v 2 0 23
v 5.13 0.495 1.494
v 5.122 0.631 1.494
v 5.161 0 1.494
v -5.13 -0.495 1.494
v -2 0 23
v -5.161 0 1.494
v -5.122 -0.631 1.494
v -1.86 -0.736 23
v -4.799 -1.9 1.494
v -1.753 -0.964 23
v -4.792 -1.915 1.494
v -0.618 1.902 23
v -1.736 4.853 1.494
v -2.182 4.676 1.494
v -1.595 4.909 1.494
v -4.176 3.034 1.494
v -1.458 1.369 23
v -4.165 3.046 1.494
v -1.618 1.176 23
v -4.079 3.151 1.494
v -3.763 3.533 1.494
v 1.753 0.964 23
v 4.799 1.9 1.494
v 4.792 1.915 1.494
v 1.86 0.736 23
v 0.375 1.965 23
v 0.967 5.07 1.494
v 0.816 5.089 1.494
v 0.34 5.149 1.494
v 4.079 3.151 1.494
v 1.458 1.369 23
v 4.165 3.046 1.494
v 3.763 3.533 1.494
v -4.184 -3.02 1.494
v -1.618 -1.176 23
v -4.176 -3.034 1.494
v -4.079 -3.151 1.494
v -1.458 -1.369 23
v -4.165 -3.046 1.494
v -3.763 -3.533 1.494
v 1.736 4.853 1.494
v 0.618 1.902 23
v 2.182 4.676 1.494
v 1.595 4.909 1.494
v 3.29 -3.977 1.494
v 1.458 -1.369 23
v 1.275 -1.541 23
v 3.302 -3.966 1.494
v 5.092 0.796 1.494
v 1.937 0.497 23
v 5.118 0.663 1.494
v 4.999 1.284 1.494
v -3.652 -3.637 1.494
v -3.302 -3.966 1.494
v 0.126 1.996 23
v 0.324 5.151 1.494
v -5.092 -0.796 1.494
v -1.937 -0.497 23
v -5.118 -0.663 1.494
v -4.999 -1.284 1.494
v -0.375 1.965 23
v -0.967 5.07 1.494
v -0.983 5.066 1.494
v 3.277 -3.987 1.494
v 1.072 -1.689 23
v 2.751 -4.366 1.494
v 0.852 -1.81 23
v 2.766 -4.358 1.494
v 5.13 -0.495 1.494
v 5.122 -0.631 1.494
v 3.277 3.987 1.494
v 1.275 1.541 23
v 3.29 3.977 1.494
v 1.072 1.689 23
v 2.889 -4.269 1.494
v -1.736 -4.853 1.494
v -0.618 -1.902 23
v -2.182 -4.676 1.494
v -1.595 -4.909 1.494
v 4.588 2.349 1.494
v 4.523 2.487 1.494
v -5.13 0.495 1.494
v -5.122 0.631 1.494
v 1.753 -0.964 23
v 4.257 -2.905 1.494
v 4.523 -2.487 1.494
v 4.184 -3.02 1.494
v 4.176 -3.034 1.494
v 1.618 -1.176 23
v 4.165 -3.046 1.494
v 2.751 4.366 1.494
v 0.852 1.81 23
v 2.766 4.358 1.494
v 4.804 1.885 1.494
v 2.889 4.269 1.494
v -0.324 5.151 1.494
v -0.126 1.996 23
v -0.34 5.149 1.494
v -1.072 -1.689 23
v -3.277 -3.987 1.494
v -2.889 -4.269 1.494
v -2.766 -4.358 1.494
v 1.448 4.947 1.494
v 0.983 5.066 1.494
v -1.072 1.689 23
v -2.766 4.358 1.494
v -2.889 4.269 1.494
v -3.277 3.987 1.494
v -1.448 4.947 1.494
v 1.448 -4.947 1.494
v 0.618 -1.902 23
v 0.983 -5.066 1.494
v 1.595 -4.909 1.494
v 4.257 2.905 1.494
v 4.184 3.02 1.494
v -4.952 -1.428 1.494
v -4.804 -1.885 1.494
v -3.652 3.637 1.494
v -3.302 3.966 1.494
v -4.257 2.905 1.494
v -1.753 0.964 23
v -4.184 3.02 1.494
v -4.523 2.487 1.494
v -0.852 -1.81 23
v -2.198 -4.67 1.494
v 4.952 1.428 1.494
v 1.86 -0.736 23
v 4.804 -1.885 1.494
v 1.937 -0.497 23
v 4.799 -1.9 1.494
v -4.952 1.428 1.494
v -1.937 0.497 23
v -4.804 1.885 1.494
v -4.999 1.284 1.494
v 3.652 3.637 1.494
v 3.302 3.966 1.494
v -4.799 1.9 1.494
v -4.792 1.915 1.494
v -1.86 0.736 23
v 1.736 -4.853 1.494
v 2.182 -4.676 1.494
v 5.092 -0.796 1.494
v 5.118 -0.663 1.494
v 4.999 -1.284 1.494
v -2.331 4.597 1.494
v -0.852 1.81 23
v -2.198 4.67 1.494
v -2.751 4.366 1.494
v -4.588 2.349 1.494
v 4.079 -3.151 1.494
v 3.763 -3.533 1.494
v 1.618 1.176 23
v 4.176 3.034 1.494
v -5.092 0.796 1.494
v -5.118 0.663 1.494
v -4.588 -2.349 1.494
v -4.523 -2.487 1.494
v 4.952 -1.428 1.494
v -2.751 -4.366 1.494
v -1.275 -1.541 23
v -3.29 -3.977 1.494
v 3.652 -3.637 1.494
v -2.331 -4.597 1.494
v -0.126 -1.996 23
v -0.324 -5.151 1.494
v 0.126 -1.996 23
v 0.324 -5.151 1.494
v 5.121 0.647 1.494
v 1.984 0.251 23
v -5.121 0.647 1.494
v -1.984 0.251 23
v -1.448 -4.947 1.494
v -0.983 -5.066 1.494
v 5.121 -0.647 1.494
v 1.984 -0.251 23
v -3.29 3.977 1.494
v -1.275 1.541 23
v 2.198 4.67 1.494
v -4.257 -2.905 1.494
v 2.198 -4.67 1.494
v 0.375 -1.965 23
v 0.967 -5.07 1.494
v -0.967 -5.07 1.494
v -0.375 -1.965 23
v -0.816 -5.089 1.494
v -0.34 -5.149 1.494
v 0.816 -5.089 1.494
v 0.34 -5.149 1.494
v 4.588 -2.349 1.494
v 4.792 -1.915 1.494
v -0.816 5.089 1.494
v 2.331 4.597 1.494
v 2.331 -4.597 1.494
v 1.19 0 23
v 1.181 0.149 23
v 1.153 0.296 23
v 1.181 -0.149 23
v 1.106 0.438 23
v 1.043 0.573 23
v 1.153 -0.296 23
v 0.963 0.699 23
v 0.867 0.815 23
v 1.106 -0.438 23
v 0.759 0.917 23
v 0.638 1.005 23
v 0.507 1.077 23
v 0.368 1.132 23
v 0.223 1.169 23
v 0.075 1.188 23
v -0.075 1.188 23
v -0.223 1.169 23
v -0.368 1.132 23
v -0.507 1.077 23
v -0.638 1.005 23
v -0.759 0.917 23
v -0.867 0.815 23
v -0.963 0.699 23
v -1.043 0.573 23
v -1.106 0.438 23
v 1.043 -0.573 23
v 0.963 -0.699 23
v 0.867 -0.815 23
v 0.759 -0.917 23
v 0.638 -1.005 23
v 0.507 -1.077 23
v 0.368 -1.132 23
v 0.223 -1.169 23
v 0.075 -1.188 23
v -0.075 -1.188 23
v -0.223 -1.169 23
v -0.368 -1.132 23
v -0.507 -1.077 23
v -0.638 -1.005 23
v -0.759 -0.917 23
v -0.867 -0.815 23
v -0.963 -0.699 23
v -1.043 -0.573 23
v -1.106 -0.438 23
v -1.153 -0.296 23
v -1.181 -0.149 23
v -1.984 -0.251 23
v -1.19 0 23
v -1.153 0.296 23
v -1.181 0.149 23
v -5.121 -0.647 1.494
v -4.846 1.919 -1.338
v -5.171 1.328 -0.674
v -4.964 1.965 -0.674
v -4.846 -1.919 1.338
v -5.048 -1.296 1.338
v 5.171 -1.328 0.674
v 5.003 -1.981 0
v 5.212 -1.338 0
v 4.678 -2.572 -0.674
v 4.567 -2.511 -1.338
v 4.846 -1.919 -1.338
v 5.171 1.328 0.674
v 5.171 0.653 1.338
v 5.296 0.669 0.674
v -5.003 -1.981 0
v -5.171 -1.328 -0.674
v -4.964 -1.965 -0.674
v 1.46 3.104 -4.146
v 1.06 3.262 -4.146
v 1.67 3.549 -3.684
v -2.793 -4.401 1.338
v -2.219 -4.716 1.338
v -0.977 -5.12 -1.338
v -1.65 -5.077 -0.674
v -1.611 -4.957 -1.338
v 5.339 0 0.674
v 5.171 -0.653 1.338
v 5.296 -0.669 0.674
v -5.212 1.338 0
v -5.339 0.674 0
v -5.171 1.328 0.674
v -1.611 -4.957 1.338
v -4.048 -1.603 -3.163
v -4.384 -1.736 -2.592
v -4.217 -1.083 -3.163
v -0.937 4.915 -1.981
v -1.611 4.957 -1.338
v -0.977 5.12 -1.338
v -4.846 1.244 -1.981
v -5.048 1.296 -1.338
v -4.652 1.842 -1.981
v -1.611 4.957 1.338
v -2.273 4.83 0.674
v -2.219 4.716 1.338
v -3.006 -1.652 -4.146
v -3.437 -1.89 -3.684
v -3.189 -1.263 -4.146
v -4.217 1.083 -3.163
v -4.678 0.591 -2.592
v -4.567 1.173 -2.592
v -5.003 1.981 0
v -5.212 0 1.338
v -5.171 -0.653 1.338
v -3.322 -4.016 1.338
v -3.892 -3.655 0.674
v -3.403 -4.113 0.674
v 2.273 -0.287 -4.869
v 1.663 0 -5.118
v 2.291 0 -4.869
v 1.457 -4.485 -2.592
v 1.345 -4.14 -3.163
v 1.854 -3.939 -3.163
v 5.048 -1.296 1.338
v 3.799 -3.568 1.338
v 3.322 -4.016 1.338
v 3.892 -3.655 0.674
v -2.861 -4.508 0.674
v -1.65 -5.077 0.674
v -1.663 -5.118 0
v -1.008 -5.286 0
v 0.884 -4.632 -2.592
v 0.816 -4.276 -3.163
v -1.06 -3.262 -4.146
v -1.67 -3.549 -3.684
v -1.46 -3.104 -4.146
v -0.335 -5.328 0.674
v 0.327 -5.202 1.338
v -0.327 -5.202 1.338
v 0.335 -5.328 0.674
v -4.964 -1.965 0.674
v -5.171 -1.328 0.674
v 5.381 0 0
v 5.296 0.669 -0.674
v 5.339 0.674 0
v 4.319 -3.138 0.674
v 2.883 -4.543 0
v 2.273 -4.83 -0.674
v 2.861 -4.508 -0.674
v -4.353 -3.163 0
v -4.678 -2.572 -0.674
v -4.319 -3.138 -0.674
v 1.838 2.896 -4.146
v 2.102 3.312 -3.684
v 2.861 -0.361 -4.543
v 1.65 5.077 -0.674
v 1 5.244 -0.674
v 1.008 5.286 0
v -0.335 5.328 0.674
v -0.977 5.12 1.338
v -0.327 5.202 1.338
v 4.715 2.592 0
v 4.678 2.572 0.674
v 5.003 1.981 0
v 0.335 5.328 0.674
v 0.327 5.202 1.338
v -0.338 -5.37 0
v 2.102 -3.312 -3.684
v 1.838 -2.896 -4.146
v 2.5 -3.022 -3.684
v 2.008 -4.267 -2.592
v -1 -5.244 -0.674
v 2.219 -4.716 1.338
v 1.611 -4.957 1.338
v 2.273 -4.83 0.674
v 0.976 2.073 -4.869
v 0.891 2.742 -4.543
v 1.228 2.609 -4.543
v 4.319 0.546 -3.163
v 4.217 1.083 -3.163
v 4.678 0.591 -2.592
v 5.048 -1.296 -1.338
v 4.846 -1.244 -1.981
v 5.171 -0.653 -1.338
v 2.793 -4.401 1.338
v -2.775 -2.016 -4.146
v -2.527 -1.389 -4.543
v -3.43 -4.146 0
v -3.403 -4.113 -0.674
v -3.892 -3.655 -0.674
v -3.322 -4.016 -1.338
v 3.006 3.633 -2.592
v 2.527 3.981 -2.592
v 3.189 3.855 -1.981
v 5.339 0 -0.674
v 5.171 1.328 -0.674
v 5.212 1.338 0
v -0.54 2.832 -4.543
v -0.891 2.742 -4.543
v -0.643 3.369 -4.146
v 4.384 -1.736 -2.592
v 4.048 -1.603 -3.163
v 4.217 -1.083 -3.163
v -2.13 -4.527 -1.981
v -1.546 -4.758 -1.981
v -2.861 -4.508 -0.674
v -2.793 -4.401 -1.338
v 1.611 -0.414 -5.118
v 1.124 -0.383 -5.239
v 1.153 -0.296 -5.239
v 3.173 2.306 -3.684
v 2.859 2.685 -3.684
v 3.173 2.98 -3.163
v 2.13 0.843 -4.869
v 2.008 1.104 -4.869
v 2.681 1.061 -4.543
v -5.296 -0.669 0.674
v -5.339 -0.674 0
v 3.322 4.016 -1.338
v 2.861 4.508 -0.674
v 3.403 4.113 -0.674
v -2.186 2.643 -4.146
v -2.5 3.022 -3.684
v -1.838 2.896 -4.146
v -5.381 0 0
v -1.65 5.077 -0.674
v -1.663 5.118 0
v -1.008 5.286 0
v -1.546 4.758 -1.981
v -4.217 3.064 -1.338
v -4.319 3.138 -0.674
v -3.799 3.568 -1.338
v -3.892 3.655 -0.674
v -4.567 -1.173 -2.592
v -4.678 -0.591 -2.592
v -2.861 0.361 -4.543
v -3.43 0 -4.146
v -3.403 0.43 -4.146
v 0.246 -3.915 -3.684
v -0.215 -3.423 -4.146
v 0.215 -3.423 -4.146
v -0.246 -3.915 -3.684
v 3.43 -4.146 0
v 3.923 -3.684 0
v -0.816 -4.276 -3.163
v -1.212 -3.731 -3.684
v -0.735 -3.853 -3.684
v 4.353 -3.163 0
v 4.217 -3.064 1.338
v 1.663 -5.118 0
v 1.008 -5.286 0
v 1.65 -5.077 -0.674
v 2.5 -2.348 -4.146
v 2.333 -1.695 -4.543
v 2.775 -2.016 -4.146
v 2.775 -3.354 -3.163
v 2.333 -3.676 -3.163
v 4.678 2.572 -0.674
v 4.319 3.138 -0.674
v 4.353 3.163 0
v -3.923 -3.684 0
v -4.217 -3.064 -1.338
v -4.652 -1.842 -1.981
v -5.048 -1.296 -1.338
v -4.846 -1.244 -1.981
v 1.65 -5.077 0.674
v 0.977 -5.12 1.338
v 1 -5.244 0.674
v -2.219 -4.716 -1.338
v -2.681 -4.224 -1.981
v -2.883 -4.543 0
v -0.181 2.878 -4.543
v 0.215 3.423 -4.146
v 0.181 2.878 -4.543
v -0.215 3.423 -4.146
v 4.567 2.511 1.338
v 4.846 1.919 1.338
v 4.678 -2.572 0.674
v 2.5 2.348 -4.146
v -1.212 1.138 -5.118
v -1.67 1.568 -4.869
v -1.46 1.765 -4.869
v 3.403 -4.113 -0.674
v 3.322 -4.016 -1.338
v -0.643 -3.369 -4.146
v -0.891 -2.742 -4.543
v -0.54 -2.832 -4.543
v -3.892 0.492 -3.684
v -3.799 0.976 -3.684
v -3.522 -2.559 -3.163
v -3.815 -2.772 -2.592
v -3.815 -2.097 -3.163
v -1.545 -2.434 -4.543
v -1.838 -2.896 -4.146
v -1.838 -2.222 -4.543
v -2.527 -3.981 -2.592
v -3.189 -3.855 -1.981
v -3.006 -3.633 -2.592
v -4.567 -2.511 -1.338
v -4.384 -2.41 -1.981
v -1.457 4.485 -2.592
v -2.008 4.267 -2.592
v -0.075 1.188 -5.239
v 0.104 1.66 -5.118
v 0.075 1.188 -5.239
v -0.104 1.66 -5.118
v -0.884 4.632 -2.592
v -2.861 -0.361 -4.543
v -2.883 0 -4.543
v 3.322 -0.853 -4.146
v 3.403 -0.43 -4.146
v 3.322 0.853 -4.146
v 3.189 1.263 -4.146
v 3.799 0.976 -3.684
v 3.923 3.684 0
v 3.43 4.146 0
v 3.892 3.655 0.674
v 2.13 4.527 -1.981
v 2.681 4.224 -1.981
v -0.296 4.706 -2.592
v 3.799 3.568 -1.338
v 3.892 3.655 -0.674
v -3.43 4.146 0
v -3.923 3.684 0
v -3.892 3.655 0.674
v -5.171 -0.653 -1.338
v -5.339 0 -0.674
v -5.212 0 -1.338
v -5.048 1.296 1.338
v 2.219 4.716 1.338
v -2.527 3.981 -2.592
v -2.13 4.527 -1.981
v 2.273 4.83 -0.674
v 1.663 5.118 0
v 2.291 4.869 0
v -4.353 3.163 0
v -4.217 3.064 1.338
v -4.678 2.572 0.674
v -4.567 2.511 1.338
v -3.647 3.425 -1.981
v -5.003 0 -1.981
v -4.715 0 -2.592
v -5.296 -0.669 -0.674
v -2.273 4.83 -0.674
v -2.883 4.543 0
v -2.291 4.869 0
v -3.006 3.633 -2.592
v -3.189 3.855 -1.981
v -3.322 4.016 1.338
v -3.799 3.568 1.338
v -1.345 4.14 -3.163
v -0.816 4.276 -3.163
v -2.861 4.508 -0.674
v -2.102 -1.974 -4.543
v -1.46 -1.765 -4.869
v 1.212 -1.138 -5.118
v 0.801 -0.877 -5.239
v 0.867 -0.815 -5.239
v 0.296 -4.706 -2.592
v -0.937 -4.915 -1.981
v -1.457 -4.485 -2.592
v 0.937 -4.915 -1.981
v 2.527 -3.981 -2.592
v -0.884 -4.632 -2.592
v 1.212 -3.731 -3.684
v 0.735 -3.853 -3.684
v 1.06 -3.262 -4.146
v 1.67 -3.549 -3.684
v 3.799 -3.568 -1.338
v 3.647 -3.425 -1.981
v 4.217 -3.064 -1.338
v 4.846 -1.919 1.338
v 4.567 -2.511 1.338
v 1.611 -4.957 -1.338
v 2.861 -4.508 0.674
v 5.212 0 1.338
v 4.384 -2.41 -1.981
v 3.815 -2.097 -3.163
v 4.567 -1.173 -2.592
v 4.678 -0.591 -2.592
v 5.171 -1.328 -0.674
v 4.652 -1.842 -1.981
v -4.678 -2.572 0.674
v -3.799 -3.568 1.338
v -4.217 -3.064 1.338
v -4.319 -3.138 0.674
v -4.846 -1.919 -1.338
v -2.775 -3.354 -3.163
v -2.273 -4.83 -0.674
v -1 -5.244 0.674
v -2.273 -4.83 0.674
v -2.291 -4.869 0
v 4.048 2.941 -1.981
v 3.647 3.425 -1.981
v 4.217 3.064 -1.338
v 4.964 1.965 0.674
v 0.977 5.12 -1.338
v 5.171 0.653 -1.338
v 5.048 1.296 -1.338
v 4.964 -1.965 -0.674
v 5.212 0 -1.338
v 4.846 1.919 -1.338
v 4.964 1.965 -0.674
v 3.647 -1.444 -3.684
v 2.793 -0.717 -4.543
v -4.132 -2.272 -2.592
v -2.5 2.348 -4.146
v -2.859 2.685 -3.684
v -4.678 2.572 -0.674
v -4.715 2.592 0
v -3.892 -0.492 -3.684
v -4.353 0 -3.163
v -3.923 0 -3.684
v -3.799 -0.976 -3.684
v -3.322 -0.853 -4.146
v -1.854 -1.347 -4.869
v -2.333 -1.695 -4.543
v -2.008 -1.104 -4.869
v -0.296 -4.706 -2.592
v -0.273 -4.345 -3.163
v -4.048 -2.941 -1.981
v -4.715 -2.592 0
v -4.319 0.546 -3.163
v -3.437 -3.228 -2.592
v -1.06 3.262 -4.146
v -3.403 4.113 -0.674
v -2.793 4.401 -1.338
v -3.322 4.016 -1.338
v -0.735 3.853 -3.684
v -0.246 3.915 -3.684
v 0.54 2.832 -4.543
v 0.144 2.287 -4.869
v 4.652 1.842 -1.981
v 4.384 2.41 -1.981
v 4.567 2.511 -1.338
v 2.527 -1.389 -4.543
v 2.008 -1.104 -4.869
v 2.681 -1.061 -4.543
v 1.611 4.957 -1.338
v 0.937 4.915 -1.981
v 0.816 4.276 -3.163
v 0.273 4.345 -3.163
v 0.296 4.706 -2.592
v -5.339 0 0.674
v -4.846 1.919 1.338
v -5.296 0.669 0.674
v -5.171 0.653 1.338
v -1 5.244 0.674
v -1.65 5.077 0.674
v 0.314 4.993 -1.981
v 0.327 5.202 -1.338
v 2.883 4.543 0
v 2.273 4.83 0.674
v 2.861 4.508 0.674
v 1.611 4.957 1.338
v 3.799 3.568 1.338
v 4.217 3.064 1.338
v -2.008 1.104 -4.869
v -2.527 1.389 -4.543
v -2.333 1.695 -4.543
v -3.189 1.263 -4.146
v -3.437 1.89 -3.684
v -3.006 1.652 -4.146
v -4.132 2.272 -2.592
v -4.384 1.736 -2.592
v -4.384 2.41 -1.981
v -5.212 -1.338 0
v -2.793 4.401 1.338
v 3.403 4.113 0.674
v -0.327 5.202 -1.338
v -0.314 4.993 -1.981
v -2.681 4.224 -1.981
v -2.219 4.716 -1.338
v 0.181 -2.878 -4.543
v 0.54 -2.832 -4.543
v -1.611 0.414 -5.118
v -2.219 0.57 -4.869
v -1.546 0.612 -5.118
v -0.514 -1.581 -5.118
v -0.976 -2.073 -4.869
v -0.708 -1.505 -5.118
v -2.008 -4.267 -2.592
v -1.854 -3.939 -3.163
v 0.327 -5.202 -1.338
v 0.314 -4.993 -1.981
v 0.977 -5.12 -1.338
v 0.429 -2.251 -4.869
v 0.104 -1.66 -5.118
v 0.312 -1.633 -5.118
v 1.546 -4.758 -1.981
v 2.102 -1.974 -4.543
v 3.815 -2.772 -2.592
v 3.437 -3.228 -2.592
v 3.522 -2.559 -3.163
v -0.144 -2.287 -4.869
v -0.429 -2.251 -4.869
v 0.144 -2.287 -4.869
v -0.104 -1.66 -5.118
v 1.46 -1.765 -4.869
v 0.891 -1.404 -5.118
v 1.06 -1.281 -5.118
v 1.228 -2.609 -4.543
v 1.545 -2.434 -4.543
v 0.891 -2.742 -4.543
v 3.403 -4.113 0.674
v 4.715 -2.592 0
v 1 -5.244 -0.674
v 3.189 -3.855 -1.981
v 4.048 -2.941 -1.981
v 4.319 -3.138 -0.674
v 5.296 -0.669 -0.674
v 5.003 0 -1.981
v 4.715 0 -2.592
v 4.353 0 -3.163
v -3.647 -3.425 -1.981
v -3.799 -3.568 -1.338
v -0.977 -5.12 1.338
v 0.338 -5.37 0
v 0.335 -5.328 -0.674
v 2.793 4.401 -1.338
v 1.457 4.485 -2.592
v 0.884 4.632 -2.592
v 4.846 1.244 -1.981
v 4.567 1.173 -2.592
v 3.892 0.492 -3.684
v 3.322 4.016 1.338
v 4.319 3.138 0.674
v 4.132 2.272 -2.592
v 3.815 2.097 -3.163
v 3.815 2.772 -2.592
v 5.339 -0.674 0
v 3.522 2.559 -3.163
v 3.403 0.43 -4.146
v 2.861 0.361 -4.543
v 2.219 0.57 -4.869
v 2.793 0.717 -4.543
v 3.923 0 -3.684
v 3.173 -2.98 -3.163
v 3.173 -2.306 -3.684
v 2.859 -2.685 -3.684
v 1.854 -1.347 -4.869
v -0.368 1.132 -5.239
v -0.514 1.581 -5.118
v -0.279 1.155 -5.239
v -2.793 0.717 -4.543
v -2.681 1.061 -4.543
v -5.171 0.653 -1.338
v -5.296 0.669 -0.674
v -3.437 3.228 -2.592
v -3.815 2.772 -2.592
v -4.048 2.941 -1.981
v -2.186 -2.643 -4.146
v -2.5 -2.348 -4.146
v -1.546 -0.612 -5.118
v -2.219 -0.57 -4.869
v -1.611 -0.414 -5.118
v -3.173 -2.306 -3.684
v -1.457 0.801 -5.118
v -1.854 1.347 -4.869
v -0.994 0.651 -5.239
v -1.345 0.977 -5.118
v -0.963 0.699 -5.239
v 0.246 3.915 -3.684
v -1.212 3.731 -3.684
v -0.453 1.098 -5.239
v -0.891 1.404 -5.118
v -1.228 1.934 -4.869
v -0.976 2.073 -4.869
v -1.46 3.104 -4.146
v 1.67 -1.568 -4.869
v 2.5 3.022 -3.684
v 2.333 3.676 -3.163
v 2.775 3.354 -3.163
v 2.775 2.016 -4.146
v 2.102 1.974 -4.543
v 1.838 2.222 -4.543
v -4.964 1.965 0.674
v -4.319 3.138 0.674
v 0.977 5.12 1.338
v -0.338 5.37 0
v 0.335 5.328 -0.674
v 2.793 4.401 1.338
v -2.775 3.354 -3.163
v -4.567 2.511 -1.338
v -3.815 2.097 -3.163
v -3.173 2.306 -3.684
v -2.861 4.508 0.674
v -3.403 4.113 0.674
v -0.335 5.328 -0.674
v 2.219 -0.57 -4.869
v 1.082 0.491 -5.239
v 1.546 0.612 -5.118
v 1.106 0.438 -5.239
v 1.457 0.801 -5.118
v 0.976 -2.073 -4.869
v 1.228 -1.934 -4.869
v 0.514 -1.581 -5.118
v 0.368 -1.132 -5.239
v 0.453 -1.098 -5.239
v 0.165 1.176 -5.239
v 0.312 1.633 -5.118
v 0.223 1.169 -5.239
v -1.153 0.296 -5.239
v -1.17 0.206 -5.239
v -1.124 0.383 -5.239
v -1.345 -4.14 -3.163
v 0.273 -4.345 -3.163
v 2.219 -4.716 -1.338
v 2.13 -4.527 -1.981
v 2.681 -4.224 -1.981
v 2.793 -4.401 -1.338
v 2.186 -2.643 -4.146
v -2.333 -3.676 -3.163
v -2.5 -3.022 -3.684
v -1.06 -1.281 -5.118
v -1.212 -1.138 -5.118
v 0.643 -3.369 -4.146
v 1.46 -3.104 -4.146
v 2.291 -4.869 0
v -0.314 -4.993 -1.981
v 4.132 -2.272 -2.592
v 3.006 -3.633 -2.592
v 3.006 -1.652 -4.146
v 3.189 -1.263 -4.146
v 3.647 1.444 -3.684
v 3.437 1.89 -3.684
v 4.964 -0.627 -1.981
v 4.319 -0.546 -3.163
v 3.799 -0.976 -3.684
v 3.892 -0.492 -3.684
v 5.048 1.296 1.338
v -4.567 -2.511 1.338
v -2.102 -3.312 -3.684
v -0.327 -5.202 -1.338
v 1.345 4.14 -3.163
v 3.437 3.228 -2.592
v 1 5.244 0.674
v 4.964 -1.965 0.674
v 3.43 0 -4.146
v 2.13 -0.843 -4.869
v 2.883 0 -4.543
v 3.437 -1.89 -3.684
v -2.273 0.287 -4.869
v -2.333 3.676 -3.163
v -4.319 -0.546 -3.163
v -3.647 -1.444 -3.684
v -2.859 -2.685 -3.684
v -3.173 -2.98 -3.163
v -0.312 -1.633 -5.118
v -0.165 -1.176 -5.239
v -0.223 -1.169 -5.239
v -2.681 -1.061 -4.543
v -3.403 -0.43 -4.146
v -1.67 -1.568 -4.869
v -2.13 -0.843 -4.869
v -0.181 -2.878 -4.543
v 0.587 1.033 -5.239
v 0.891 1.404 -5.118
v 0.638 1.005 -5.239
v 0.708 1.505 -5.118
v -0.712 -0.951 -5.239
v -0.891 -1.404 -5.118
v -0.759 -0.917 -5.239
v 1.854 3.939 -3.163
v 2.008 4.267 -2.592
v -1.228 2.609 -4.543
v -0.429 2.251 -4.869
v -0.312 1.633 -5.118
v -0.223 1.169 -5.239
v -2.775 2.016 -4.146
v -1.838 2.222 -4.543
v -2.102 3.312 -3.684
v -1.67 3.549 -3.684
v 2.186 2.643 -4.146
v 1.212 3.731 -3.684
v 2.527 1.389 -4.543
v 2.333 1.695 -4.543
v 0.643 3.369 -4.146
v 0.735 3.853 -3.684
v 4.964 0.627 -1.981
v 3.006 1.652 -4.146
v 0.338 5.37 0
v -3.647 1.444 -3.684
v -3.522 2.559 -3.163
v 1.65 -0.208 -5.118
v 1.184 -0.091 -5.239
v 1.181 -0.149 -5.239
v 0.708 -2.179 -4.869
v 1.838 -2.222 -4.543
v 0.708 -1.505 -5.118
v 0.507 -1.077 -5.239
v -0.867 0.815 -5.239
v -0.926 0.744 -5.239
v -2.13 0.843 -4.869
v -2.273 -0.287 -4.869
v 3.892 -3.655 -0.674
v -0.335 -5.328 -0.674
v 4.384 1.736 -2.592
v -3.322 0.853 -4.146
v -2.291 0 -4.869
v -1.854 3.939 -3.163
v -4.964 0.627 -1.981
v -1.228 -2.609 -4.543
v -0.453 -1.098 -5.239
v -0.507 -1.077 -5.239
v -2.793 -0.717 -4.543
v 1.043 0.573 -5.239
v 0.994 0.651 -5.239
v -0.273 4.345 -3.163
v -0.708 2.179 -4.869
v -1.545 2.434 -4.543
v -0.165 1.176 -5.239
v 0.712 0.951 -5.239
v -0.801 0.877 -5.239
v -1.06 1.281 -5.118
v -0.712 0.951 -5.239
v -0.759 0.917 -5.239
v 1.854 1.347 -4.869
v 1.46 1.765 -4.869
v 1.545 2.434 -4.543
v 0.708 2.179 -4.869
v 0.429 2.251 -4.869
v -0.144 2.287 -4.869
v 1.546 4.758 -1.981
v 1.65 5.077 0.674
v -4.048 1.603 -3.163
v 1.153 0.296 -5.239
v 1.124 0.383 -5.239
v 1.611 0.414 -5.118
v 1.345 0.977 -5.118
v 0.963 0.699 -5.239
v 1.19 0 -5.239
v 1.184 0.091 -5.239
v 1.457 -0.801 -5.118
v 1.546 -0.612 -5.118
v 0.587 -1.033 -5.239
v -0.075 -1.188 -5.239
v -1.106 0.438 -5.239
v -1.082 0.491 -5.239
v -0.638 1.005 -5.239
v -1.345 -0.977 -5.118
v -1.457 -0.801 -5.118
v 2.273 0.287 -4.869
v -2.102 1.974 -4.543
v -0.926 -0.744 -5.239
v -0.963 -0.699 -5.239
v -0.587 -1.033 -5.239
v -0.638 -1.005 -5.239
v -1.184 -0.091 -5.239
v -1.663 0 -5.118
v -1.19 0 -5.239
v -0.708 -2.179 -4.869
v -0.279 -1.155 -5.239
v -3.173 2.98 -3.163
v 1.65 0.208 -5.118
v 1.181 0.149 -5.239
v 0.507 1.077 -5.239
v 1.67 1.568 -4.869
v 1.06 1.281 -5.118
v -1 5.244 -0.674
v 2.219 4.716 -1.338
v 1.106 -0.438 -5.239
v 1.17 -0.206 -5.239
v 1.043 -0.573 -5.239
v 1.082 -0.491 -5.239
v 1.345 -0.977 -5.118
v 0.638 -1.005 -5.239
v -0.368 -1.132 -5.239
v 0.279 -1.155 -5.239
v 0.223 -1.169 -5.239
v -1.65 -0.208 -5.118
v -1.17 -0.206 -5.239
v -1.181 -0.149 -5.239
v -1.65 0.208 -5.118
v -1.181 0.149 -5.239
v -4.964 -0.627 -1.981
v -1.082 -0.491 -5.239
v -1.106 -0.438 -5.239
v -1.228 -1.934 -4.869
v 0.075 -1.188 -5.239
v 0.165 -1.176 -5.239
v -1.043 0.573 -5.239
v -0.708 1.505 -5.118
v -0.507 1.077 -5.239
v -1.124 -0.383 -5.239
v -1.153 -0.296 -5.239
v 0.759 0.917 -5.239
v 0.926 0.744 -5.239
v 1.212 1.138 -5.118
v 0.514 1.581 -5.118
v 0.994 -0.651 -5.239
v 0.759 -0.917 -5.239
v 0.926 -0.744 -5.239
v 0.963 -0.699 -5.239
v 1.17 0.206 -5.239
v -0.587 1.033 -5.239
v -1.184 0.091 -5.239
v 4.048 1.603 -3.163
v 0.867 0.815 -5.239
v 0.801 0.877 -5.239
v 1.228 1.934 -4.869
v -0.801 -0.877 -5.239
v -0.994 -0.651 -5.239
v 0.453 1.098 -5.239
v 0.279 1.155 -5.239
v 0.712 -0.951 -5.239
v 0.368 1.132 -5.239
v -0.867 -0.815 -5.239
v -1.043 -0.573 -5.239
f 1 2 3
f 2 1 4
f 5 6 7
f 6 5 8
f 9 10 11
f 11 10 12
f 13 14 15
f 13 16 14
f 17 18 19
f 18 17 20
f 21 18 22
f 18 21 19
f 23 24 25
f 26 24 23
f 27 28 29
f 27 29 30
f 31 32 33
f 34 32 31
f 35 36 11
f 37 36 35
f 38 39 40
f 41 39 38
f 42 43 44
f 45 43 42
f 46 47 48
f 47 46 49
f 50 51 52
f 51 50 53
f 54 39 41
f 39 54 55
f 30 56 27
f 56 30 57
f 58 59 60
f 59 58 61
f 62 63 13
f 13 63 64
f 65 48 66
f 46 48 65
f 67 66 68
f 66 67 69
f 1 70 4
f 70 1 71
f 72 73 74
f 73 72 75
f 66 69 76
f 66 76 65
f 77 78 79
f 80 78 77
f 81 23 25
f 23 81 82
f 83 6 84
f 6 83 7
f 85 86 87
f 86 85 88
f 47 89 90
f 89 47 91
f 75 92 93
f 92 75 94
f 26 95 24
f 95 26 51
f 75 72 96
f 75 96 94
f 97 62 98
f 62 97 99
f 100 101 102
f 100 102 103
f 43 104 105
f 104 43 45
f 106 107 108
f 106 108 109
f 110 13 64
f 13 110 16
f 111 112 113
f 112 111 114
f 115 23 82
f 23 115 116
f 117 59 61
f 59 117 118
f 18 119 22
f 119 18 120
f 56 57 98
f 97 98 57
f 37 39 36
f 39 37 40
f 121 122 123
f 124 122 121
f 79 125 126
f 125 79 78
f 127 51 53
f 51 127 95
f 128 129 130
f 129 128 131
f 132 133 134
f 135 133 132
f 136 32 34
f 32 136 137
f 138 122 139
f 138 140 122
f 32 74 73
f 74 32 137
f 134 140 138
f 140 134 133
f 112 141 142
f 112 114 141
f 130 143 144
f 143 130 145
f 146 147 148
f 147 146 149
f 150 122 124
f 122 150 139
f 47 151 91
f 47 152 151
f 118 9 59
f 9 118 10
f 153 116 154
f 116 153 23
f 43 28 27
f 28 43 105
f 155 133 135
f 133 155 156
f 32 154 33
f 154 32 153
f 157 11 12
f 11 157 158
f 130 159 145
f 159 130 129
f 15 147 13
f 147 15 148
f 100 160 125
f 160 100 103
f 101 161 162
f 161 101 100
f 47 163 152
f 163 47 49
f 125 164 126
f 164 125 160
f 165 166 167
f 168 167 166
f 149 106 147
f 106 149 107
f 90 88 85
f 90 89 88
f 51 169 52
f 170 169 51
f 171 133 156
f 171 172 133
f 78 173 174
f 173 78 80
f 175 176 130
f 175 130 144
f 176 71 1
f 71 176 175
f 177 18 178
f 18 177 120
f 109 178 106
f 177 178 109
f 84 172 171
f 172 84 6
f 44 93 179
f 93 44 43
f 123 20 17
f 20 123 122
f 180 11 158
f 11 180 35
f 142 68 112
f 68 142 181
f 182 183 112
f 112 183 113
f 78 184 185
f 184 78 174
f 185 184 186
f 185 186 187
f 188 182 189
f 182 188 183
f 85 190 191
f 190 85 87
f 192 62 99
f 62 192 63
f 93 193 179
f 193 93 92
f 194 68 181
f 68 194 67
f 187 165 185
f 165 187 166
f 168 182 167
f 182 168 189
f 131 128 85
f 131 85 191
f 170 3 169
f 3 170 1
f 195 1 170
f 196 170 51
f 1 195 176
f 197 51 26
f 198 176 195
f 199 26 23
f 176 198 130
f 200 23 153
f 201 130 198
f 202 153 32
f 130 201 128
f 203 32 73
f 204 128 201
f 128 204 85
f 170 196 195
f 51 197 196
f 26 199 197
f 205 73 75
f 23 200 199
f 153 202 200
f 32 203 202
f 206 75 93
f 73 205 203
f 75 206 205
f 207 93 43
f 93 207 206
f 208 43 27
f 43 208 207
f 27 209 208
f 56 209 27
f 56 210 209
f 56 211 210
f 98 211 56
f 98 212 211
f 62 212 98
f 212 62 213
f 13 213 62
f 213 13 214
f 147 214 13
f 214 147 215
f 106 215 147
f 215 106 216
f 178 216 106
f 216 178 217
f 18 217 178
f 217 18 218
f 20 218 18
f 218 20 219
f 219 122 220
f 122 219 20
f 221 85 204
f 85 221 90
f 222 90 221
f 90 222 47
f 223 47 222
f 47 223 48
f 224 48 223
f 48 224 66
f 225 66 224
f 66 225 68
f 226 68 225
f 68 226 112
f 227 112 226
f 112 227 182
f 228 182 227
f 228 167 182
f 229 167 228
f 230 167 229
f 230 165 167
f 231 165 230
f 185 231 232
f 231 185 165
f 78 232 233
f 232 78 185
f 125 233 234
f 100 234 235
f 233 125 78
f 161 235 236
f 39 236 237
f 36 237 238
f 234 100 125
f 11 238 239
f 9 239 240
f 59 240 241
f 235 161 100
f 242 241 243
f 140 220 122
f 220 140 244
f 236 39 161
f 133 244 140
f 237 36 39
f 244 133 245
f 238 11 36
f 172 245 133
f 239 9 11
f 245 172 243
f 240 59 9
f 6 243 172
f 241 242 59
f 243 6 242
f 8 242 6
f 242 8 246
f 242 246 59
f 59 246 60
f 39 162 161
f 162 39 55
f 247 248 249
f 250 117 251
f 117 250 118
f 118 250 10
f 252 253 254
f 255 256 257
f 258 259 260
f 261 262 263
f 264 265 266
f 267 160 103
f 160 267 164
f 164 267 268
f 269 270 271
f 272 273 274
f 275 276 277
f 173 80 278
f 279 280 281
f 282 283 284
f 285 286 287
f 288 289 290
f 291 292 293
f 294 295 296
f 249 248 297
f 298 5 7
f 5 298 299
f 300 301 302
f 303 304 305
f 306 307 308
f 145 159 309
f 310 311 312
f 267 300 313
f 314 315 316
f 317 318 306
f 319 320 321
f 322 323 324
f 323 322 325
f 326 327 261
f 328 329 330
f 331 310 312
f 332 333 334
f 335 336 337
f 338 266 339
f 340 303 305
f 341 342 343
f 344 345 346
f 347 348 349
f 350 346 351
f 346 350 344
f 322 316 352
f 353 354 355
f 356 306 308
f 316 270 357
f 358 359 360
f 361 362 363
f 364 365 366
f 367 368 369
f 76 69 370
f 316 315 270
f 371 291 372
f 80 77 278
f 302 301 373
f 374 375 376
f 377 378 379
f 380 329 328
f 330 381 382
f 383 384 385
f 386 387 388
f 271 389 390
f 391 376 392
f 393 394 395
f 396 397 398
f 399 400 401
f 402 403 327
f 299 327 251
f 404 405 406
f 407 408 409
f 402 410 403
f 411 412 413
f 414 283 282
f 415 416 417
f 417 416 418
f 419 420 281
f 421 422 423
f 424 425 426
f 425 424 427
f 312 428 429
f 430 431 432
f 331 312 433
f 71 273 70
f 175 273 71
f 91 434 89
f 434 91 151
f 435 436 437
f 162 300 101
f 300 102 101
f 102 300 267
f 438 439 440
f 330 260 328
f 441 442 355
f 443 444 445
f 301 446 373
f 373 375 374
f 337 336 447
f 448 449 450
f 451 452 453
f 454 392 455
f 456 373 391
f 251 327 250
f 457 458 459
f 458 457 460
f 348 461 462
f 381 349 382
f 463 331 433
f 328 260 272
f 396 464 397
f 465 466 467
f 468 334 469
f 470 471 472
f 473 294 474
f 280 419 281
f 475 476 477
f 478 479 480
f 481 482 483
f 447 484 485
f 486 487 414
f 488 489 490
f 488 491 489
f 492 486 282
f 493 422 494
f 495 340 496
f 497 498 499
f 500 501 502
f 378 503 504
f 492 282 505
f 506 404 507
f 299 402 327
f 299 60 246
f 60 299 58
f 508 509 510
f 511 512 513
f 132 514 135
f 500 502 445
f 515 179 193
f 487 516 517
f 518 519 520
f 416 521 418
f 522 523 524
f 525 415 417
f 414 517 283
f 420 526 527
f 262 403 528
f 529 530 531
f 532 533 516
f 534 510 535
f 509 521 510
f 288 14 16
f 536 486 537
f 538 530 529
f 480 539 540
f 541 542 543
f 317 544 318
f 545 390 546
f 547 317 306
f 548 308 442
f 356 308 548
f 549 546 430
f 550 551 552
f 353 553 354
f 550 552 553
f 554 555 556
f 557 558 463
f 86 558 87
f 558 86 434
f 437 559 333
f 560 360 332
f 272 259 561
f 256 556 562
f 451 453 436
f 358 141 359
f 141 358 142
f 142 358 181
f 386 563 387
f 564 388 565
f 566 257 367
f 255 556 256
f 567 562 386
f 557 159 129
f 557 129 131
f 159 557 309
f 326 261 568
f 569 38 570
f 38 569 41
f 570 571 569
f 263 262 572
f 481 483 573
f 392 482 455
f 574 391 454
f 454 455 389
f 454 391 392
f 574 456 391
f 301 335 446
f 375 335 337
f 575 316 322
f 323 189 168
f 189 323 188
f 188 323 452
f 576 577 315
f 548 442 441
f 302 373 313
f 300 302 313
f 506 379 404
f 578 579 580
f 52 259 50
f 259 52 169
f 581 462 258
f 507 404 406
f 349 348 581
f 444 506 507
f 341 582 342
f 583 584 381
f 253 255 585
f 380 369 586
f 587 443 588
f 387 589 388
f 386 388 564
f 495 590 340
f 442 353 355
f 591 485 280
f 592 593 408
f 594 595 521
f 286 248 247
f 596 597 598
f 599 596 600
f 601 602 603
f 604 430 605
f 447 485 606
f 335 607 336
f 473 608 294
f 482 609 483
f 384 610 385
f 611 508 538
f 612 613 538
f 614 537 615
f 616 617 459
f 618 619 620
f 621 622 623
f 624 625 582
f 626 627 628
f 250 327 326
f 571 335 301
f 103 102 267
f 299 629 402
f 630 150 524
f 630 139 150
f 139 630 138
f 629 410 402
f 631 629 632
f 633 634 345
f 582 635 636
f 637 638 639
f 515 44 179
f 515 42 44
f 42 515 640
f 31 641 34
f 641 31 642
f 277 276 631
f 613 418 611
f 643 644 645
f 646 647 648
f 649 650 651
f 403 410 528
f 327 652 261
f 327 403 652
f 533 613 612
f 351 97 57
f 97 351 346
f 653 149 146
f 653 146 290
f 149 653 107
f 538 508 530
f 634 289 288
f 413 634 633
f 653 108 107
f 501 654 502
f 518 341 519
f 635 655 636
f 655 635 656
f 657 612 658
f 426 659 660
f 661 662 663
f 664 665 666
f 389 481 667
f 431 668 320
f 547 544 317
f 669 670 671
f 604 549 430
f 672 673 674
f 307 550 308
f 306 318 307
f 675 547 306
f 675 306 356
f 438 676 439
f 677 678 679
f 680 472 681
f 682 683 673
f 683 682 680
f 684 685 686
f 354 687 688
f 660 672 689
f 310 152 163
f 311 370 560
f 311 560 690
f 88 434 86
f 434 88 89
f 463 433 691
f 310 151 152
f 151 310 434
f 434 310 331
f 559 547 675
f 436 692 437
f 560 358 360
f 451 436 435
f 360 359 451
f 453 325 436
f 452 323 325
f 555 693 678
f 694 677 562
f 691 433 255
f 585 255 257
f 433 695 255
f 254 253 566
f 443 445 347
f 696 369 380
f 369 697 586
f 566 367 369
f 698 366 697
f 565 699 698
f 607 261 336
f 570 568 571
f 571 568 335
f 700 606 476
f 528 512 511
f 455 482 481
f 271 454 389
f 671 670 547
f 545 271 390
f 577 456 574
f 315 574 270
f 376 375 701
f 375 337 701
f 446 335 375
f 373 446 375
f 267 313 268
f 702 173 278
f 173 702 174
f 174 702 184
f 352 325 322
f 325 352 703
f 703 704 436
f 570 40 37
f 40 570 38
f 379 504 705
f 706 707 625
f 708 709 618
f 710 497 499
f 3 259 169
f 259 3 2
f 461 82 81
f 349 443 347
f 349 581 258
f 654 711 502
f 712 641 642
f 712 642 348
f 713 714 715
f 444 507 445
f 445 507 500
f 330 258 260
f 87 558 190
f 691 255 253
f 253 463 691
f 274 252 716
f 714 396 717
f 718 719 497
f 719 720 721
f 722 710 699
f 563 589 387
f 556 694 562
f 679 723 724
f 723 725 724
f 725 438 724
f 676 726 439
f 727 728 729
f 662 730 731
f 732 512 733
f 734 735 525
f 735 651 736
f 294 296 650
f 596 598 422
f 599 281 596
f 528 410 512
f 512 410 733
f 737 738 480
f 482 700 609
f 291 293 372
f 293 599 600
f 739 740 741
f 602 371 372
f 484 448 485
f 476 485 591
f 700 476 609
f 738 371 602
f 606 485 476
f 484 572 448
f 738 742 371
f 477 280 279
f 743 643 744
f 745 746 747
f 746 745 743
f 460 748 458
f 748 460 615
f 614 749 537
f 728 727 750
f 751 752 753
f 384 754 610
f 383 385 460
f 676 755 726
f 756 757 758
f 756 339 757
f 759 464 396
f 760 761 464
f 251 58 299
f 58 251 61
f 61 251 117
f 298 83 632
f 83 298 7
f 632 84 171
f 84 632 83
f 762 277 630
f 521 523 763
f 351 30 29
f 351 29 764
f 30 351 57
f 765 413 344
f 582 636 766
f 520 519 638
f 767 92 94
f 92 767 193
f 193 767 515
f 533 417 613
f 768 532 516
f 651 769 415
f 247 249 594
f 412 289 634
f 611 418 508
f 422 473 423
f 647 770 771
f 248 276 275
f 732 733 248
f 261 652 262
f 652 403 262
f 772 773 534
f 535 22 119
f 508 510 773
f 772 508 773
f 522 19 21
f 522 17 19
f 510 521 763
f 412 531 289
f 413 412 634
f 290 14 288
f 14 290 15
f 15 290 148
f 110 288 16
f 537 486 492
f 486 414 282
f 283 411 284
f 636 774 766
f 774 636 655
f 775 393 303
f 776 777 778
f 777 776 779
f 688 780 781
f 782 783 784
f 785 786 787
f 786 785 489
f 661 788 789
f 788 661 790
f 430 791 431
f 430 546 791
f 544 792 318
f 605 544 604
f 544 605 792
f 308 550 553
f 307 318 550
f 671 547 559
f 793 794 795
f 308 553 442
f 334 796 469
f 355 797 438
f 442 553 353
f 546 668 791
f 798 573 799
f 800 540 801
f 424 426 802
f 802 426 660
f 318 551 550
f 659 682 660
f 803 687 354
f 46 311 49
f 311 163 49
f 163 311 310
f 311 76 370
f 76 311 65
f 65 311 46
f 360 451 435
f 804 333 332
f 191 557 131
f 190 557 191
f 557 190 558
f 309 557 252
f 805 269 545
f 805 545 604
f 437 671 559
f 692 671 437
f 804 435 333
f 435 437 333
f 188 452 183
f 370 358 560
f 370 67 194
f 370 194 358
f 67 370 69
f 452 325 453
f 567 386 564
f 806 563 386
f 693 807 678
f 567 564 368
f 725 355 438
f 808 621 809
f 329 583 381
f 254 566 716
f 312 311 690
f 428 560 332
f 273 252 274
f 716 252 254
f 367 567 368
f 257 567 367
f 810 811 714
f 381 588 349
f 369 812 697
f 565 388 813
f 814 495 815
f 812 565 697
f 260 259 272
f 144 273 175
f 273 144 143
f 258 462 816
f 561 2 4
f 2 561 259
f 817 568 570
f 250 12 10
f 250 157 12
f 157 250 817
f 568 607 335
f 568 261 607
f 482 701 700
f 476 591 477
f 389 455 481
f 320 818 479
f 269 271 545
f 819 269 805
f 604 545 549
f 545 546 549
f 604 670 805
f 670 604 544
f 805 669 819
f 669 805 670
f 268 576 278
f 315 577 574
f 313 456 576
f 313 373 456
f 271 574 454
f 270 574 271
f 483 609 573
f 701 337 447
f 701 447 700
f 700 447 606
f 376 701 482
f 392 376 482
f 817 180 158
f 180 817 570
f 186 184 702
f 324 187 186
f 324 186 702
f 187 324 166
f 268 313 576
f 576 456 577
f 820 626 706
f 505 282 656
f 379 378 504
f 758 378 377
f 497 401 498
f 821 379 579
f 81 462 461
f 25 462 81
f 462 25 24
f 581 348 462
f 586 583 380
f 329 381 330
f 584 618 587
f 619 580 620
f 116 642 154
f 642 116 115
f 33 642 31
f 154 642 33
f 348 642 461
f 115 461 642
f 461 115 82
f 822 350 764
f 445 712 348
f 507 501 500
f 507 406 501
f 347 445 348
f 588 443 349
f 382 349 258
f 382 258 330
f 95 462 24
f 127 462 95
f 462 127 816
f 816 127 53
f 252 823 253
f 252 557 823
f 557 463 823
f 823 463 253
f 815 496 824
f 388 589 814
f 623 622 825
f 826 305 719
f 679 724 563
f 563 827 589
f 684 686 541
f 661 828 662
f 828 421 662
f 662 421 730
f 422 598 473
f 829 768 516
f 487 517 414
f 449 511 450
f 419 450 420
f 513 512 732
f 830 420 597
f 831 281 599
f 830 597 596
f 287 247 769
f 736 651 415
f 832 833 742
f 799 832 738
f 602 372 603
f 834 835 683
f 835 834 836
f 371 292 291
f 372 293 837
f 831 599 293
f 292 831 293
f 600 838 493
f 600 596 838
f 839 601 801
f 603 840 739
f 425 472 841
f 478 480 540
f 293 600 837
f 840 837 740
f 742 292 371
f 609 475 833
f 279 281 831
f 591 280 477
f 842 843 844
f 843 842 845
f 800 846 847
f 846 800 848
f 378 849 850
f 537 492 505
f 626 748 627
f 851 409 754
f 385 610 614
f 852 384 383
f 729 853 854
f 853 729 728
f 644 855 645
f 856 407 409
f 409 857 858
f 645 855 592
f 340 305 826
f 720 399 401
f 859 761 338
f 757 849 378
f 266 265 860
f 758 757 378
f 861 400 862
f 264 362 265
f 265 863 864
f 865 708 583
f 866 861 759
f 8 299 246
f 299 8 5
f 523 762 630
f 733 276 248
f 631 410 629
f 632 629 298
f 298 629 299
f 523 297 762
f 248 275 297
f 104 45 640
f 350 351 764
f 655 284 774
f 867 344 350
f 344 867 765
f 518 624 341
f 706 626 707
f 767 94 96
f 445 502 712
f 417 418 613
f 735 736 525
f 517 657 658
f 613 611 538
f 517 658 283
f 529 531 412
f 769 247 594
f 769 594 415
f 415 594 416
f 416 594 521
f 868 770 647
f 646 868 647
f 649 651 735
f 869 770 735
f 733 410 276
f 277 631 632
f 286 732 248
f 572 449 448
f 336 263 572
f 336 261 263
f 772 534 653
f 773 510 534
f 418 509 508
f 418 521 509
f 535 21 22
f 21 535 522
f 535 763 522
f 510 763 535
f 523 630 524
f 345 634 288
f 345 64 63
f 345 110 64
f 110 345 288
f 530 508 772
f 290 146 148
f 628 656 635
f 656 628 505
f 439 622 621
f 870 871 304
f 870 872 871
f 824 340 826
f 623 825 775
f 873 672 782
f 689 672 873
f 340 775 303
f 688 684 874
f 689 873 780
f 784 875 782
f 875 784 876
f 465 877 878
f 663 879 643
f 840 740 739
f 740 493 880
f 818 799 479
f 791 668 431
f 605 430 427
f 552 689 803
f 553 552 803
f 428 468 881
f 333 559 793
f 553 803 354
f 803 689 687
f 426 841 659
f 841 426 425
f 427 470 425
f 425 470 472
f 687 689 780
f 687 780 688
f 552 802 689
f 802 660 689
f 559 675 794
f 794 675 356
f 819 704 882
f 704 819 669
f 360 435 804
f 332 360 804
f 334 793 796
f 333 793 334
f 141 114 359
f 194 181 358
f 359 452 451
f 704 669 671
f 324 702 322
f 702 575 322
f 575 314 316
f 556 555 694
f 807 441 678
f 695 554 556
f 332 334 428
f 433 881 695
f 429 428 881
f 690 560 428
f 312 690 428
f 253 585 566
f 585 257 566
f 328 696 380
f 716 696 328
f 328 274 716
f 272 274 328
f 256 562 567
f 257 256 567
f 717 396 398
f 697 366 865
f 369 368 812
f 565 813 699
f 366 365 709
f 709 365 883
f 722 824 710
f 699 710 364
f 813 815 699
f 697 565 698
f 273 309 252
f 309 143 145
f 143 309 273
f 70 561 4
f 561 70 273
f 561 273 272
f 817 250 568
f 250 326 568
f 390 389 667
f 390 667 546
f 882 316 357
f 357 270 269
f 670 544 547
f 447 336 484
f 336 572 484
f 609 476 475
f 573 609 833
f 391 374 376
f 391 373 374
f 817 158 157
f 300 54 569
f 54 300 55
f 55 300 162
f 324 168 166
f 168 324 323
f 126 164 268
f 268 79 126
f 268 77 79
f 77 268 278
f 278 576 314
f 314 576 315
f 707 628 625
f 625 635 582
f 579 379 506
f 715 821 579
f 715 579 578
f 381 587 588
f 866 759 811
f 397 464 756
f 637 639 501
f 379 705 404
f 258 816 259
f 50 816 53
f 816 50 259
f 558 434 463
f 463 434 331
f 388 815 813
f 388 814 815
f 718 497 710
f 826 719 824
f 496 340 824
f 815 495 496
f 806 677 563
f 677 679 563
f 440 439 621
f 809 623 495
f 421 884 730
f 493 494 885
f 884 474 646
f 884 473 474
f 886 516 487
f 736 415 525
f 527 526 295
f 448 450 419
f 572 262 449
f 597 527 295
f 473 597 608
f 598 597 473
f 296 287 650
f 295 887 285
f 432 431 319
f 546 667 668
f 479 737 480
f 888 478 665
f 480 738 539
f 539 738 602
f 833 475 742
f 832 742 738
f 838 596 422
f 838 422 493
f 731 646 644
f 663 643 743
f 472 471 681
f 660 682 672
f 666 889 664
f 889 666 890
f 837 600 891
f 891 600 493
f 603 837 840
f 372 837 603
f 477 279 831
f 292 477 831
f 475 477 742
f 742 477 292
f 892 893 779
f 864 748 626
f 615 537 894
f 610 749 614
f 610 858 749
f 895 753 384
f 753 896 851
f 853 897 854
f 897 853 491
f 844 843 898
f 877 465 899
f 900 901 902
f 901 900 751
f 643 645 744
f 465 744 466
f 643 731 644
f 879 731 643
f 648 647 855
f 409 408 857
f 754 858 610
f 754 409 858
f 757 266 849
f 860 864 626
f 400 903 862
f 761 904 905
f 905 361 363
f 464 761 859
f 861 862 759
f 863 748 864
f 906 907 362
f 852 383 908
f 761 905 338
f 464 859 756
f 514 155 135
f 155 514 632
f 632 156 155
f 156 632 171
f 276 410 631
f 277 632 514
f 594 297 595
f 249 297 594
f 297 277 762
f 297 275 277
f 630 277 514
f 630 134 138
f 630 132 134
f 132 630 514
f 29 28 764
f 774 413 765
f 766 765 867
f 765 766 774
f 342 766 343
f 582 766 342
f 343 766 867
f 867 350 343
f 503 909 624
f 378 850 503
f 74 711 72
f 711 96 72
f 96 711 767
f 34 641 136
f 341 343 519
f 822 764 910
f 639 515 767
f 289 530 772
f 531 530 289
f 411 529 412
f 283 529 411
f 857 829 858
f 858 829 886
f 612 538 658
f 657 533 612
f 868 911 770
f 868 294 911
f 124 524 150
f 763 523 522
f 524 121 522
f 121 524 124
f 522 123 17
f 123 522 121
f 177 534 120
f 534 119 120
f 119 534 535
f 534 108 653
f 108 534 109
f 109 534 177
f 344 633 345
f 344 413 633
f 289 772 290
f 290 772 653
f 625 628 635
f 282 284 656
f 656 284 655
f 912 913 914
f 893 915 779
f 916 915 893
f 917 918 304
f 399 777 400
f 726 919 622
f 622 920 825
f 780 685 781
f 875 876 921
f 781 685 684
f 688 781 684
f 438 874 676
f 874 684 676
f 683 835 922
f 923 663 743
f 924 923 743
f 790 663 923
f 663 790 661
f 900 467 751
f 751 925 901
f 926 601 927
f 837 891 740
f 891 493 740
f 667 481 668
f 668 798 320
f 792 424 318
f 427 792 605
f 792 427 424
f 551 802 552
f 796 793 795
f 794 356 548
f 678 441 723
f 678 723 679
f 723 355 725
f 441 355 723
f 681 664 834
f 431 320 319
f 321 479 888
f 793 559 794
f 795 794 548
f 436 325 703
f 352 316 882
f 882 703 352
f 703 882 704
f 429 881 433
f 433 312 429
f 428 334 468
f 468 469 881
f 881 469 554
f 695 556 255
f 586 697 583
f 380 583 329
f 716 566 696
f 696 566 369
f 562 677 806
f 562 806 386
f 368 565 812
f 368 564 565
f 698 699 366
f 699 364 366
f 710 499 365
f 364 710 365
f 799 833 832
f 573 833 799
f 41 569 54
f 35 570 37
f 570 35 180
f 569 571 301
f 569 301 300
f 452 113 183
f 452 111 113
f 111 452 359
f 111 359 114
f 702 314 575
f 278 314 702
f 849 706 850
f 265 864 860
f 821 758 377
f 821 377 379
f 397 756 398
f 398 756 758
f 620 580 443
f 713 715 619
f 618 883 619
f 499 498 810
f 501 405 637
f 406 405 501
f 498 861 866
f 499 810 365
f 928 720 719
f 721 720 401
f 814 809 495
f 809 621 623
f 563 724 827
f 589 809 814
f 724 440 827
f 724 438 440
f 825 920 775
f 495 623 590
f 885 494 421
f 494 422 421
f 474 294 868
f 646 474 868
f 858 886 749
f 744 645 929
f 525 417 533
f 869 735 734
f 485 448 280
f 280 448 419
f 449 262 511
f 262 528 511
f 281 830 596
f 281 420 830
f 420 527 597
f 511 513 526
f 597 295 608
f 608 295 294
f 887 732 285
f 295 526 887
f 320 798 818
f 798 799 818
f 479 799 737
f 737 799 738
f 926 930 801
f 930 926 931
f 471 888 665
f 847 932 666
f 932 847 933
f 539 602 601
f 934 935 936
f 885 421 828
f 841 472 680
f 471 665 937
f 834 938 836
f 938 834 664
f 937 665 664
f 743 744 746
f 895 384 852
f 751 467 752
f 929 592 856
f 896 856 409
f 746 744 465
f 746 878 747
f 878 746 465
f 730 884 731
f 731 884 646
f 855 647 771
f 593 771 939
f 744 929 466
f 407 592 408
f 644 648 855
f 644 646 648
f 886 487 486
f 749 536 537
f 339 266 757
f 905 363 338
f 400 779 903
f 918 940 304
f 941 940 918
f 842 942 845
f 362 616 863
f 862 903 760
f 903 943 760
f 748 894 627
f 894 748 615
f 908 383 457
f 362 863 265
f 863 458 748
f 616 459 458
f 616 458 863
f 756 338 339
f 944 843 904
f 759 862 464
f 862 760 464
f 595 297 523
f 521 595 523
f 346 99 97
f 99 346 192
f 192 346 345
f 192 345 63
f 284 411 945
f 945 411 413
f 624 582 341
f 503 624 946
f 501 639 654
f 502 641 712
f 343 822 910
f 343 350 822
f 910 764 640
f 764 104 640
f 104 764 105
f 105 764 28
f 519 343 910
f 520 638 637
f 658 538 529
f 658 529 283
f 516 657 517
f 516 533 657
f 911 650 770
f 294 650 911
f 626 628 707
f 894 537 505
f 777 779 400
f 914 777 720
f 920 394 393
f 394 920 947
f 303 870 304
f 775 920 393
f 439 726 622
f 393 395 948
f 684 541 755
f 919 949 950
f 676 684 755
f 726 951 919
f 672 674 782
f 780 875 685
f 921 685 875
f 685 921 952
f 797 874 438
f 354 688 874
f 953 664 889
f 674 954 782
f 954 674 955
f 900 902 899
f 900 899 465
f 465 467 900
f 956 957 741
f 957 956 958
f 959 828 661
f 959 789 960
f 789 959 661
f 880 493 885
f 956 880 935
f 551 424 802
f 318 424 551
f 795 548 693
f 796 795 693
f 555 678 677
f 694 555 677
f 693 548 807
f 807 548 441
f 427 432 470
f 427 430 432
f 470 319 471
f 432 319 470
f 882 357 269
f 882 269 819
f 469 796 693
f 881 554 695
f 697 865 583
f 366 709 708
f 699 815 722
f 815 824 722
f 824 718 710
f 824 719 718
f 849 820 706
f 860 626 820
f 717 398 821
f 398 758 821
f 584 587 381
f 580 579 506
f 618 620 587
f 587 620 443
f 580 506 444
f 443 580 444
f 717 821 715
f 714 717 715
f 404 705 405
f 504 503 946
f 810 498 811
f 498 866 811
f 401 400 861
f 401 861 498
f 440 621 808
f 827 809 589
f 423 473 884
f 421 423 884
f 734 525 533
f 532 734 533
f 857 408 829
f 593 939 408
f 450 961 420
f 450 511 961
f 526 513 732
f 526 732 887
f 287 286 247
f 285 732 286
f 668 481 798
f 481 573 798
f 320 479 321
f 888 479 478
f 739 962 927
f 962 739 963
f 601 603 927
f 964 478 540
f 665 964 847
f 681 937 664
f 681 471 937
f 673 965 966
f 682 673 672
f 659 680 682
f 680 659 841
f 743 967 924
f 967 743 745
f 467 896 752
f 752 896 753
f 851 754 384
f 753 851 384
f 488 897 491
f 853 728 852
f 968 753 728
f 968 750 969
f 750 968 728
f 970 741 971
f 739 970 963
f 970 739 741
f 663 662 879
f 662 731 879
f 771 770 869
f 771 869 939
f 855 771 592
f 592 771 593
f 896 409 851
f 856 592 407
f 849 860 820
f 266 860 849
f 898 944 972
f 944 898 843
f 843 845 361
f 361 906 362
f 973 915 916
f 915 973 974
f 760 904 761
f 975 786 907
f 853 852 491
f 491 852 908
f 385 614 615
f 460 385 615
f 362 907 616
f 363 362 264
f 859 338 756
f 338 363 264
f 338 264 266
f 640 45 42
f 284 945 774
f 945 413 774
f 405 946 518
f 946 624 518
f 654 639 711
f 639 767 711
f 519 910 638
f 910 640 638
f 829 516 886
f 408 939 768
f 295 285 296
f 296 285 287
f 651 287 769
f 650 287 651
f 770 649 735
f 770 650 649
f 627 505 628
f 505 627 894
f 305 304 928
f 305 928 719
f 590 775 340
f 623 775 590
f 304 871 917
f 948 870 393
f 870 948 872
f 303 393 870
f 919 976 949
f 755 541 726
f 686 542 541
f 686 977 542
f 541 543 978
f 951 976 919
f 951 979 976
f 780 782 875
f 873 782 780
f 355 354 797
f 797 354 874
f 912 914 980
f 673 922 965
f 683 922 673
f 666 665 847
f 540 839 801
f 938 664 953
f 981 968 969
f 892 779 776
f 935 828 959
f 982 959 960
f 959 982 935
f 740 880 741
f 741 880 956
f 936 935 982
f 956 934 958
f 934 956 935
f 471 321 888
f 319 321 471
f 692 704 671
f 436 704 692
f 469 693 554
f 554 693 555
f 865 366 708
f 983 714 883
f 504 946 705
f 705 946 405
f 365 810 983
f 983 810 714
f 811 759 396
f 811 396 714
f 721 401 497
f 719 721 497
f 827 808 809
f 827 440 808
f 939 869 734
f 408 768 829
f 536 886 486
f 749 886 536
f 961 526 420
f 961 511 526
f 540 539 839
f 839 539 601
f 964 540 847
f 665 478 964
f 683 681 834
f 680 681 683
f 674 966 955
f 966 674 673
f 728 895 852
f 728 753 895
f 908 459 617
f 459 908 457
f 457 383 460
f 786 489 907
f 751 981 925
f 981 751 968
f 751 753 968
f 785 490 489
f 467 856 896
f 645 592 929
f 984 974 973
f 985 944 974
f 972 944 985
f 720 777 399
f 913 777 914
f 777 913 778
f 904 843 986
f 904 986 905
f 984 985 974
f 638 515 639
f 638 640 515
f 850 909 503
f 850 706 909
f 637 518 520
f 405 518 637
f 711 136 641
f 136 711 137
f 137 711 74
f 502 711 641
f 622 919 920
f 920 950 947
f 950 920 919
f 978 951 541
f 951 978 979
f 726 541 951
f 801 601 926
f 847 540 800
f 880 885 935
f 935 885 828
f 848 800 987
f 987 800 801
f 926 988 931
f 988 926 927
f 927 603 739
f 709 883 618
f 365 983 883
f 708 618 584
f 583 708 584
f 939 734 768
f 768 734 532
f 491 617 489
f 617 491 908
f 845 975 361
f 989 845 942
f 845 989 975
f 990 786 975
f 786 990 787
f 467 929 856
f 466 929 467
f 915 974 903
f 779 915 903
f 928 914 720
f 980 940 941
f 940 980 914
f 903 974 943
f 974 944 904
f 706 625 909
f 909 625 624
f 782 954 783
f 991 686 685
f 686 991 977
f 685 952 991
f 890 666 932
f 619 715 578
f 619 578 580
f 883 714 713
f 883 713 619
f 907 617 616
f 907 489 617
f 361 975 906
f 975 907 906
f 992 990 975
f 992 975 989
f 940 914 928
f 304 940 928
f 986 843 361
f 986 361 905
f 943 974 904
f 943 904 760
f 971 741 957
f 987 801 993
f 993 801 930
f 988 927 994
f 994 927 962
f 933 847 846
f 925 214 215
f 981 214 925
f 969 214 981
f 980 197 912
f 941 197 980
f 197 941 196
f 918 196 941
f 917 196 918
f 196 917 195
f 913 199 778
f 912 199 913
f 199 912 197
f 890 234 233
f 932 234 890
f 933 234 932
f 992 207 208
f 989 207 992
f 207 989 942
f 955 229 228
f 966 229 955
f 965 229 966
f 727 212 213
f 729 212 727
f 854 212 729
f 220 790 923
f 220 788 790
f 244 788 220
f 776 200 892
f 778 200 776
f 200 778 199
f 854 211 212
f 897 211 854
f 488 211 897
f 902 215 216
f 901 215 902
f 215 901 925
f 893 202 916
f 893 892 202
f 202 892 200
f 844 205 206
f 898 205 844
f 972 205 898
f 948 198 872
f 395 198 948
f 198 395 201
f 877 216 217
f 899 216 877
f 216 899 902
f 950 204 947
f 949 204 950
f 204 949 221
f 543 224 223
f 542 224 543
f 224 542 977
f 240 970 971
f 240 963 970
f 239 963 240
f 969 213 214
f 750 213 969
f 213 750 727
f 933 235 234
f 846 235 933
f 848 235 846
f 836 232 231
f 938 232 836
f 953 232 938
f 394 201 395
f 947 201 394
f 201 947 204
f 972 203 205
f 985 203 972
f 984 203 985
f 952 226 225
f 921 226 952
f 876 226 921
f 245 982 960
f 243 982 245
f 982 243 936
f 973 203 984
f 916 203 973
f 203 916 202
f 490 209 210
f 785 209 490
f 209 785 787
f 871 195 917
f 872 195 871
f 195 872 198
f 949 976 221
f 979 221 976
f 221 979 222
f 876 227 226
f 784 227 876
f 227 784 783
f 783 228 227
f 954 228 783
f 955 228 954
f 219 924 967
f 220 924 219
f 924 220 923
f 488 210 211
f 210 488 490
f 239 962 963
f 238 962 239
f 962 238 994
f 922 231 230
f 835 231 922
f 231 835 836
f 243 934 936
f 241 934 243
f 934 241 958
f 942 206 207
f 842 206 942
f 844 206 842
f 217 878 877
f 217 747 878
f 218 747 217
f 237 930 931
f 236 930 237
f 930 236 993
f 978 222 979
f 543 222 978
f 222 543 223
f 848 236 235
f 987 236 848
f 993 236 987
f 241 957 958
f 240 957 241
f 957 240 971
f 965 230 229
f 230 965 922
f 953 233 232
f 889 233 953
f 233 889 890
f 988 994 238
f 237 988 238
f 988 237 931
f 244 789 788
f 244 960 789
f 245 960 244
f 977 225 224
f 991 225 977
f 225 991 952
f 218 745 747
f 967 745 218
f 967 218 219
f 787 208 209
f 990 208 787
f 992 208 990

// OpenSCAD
/*
3D model for a cone fid for a Wichard quick release snap shackle
See http://marine.wichard.com/rubrique-Quick_release_snap_shackles-0202040300000000-ME.html
Make two pieces per snap shackle.
Recommend this be printed in PLA with 3 shells, 100 % infill and supports.
Author: Philip B Chase, <philipbchase@gmail.com>

Assembly: This design is meant to be assembled on a short, folded, segment of
    300# Spectra line that passes through the release gate of the snap shackle.
    The narrow tip of each piece faces the shackle. A handle--printed separately
    --sits below this cone fid. The spectra is folded in half,
    tied at the loose end and pulled through the entire assembly with a wire fid.
    The folded end of the line is locked in place by a very small segment of line
    knotted and larksheaded on the end.

Use: When pulled, this object pulls the opposite cone into the release gate to
    open the snap hook. Once released, the cone often stays in the release gate
    holding the gate open. This allows the gate to be reclosed with zero-force
    before pulling the cone out of the gate.

License: To the extent possible under law, Philip B Chase has waived all
    copyright and related or neighboring rights to 3D model for a cone fid and
    handle to release a Wichard quick release snap shackle. This work is
    published from: United States.
    See: http://creativecommons.org/publicdomain/zero/1.0/
*/

/*
The dimensions of the pull

Dimensions of the exterior cone that enters the snaphook gate. The tip radius
and taper are the most critical dimensions.  The tip diameter must be just
small enough to reliably enter the gate, but large enough to be durable as it
will receive the most wear. The taper of the cone must be steep enough to open
the gate before the tip hits to opposite side of the gate as the tip can jam
on the opposite gate. The the taper must be shallow enough that the cone
requires minimal force the open the gate.
*/
exterior_cone_tip_r = 4.0/2;  // a cone tip diameter of 4 mm allowed reliable entry into the gate in testing
exterior_cone_slope = 0.147;  // a slope of 0.147 did well in tests
// The cone height defines the overall length of the pull.  The height must
// allow two fingers to grip the base of the cone.
exterior_cone_h = 23;
exterior_cone_base_r = exterior_cone_slope * exterior_cone_h + exterior_cone_tip_r;
echo("exterior_cone_base_r: ", exterior_cone_base_r);

// The dimensions of the bore that passes through the handle and cone.
// The bore radius needs to be just large enough to allow a sturdy spectra
// line to pass through when doubled, yet small enough to assure the wall
// thickness at the tip is enough to not degrade in normal use.
bore_r = 2.38/2;
fid_height = exterior_cone_h + exterior_cone_base_r;
echo("fid_height: ", fid_height);
bore_h = 2 * bore_r + fid_height;

// set the facet number high (40-60) for final generation
$fn = 50;

difference() {
    union() {
        cylinder(h = exterior_cone_h, r1 = exterior_cone_base_r, r2 = exterior_cone_tip_r);
        sphere(r=exterior_cone_base_r);
    }
    translate([0,0,-bore_r-exterior_cone_base_r])
        cylinder(h = bore_h, r1 = bore_r, r2 = bore_r);
}
